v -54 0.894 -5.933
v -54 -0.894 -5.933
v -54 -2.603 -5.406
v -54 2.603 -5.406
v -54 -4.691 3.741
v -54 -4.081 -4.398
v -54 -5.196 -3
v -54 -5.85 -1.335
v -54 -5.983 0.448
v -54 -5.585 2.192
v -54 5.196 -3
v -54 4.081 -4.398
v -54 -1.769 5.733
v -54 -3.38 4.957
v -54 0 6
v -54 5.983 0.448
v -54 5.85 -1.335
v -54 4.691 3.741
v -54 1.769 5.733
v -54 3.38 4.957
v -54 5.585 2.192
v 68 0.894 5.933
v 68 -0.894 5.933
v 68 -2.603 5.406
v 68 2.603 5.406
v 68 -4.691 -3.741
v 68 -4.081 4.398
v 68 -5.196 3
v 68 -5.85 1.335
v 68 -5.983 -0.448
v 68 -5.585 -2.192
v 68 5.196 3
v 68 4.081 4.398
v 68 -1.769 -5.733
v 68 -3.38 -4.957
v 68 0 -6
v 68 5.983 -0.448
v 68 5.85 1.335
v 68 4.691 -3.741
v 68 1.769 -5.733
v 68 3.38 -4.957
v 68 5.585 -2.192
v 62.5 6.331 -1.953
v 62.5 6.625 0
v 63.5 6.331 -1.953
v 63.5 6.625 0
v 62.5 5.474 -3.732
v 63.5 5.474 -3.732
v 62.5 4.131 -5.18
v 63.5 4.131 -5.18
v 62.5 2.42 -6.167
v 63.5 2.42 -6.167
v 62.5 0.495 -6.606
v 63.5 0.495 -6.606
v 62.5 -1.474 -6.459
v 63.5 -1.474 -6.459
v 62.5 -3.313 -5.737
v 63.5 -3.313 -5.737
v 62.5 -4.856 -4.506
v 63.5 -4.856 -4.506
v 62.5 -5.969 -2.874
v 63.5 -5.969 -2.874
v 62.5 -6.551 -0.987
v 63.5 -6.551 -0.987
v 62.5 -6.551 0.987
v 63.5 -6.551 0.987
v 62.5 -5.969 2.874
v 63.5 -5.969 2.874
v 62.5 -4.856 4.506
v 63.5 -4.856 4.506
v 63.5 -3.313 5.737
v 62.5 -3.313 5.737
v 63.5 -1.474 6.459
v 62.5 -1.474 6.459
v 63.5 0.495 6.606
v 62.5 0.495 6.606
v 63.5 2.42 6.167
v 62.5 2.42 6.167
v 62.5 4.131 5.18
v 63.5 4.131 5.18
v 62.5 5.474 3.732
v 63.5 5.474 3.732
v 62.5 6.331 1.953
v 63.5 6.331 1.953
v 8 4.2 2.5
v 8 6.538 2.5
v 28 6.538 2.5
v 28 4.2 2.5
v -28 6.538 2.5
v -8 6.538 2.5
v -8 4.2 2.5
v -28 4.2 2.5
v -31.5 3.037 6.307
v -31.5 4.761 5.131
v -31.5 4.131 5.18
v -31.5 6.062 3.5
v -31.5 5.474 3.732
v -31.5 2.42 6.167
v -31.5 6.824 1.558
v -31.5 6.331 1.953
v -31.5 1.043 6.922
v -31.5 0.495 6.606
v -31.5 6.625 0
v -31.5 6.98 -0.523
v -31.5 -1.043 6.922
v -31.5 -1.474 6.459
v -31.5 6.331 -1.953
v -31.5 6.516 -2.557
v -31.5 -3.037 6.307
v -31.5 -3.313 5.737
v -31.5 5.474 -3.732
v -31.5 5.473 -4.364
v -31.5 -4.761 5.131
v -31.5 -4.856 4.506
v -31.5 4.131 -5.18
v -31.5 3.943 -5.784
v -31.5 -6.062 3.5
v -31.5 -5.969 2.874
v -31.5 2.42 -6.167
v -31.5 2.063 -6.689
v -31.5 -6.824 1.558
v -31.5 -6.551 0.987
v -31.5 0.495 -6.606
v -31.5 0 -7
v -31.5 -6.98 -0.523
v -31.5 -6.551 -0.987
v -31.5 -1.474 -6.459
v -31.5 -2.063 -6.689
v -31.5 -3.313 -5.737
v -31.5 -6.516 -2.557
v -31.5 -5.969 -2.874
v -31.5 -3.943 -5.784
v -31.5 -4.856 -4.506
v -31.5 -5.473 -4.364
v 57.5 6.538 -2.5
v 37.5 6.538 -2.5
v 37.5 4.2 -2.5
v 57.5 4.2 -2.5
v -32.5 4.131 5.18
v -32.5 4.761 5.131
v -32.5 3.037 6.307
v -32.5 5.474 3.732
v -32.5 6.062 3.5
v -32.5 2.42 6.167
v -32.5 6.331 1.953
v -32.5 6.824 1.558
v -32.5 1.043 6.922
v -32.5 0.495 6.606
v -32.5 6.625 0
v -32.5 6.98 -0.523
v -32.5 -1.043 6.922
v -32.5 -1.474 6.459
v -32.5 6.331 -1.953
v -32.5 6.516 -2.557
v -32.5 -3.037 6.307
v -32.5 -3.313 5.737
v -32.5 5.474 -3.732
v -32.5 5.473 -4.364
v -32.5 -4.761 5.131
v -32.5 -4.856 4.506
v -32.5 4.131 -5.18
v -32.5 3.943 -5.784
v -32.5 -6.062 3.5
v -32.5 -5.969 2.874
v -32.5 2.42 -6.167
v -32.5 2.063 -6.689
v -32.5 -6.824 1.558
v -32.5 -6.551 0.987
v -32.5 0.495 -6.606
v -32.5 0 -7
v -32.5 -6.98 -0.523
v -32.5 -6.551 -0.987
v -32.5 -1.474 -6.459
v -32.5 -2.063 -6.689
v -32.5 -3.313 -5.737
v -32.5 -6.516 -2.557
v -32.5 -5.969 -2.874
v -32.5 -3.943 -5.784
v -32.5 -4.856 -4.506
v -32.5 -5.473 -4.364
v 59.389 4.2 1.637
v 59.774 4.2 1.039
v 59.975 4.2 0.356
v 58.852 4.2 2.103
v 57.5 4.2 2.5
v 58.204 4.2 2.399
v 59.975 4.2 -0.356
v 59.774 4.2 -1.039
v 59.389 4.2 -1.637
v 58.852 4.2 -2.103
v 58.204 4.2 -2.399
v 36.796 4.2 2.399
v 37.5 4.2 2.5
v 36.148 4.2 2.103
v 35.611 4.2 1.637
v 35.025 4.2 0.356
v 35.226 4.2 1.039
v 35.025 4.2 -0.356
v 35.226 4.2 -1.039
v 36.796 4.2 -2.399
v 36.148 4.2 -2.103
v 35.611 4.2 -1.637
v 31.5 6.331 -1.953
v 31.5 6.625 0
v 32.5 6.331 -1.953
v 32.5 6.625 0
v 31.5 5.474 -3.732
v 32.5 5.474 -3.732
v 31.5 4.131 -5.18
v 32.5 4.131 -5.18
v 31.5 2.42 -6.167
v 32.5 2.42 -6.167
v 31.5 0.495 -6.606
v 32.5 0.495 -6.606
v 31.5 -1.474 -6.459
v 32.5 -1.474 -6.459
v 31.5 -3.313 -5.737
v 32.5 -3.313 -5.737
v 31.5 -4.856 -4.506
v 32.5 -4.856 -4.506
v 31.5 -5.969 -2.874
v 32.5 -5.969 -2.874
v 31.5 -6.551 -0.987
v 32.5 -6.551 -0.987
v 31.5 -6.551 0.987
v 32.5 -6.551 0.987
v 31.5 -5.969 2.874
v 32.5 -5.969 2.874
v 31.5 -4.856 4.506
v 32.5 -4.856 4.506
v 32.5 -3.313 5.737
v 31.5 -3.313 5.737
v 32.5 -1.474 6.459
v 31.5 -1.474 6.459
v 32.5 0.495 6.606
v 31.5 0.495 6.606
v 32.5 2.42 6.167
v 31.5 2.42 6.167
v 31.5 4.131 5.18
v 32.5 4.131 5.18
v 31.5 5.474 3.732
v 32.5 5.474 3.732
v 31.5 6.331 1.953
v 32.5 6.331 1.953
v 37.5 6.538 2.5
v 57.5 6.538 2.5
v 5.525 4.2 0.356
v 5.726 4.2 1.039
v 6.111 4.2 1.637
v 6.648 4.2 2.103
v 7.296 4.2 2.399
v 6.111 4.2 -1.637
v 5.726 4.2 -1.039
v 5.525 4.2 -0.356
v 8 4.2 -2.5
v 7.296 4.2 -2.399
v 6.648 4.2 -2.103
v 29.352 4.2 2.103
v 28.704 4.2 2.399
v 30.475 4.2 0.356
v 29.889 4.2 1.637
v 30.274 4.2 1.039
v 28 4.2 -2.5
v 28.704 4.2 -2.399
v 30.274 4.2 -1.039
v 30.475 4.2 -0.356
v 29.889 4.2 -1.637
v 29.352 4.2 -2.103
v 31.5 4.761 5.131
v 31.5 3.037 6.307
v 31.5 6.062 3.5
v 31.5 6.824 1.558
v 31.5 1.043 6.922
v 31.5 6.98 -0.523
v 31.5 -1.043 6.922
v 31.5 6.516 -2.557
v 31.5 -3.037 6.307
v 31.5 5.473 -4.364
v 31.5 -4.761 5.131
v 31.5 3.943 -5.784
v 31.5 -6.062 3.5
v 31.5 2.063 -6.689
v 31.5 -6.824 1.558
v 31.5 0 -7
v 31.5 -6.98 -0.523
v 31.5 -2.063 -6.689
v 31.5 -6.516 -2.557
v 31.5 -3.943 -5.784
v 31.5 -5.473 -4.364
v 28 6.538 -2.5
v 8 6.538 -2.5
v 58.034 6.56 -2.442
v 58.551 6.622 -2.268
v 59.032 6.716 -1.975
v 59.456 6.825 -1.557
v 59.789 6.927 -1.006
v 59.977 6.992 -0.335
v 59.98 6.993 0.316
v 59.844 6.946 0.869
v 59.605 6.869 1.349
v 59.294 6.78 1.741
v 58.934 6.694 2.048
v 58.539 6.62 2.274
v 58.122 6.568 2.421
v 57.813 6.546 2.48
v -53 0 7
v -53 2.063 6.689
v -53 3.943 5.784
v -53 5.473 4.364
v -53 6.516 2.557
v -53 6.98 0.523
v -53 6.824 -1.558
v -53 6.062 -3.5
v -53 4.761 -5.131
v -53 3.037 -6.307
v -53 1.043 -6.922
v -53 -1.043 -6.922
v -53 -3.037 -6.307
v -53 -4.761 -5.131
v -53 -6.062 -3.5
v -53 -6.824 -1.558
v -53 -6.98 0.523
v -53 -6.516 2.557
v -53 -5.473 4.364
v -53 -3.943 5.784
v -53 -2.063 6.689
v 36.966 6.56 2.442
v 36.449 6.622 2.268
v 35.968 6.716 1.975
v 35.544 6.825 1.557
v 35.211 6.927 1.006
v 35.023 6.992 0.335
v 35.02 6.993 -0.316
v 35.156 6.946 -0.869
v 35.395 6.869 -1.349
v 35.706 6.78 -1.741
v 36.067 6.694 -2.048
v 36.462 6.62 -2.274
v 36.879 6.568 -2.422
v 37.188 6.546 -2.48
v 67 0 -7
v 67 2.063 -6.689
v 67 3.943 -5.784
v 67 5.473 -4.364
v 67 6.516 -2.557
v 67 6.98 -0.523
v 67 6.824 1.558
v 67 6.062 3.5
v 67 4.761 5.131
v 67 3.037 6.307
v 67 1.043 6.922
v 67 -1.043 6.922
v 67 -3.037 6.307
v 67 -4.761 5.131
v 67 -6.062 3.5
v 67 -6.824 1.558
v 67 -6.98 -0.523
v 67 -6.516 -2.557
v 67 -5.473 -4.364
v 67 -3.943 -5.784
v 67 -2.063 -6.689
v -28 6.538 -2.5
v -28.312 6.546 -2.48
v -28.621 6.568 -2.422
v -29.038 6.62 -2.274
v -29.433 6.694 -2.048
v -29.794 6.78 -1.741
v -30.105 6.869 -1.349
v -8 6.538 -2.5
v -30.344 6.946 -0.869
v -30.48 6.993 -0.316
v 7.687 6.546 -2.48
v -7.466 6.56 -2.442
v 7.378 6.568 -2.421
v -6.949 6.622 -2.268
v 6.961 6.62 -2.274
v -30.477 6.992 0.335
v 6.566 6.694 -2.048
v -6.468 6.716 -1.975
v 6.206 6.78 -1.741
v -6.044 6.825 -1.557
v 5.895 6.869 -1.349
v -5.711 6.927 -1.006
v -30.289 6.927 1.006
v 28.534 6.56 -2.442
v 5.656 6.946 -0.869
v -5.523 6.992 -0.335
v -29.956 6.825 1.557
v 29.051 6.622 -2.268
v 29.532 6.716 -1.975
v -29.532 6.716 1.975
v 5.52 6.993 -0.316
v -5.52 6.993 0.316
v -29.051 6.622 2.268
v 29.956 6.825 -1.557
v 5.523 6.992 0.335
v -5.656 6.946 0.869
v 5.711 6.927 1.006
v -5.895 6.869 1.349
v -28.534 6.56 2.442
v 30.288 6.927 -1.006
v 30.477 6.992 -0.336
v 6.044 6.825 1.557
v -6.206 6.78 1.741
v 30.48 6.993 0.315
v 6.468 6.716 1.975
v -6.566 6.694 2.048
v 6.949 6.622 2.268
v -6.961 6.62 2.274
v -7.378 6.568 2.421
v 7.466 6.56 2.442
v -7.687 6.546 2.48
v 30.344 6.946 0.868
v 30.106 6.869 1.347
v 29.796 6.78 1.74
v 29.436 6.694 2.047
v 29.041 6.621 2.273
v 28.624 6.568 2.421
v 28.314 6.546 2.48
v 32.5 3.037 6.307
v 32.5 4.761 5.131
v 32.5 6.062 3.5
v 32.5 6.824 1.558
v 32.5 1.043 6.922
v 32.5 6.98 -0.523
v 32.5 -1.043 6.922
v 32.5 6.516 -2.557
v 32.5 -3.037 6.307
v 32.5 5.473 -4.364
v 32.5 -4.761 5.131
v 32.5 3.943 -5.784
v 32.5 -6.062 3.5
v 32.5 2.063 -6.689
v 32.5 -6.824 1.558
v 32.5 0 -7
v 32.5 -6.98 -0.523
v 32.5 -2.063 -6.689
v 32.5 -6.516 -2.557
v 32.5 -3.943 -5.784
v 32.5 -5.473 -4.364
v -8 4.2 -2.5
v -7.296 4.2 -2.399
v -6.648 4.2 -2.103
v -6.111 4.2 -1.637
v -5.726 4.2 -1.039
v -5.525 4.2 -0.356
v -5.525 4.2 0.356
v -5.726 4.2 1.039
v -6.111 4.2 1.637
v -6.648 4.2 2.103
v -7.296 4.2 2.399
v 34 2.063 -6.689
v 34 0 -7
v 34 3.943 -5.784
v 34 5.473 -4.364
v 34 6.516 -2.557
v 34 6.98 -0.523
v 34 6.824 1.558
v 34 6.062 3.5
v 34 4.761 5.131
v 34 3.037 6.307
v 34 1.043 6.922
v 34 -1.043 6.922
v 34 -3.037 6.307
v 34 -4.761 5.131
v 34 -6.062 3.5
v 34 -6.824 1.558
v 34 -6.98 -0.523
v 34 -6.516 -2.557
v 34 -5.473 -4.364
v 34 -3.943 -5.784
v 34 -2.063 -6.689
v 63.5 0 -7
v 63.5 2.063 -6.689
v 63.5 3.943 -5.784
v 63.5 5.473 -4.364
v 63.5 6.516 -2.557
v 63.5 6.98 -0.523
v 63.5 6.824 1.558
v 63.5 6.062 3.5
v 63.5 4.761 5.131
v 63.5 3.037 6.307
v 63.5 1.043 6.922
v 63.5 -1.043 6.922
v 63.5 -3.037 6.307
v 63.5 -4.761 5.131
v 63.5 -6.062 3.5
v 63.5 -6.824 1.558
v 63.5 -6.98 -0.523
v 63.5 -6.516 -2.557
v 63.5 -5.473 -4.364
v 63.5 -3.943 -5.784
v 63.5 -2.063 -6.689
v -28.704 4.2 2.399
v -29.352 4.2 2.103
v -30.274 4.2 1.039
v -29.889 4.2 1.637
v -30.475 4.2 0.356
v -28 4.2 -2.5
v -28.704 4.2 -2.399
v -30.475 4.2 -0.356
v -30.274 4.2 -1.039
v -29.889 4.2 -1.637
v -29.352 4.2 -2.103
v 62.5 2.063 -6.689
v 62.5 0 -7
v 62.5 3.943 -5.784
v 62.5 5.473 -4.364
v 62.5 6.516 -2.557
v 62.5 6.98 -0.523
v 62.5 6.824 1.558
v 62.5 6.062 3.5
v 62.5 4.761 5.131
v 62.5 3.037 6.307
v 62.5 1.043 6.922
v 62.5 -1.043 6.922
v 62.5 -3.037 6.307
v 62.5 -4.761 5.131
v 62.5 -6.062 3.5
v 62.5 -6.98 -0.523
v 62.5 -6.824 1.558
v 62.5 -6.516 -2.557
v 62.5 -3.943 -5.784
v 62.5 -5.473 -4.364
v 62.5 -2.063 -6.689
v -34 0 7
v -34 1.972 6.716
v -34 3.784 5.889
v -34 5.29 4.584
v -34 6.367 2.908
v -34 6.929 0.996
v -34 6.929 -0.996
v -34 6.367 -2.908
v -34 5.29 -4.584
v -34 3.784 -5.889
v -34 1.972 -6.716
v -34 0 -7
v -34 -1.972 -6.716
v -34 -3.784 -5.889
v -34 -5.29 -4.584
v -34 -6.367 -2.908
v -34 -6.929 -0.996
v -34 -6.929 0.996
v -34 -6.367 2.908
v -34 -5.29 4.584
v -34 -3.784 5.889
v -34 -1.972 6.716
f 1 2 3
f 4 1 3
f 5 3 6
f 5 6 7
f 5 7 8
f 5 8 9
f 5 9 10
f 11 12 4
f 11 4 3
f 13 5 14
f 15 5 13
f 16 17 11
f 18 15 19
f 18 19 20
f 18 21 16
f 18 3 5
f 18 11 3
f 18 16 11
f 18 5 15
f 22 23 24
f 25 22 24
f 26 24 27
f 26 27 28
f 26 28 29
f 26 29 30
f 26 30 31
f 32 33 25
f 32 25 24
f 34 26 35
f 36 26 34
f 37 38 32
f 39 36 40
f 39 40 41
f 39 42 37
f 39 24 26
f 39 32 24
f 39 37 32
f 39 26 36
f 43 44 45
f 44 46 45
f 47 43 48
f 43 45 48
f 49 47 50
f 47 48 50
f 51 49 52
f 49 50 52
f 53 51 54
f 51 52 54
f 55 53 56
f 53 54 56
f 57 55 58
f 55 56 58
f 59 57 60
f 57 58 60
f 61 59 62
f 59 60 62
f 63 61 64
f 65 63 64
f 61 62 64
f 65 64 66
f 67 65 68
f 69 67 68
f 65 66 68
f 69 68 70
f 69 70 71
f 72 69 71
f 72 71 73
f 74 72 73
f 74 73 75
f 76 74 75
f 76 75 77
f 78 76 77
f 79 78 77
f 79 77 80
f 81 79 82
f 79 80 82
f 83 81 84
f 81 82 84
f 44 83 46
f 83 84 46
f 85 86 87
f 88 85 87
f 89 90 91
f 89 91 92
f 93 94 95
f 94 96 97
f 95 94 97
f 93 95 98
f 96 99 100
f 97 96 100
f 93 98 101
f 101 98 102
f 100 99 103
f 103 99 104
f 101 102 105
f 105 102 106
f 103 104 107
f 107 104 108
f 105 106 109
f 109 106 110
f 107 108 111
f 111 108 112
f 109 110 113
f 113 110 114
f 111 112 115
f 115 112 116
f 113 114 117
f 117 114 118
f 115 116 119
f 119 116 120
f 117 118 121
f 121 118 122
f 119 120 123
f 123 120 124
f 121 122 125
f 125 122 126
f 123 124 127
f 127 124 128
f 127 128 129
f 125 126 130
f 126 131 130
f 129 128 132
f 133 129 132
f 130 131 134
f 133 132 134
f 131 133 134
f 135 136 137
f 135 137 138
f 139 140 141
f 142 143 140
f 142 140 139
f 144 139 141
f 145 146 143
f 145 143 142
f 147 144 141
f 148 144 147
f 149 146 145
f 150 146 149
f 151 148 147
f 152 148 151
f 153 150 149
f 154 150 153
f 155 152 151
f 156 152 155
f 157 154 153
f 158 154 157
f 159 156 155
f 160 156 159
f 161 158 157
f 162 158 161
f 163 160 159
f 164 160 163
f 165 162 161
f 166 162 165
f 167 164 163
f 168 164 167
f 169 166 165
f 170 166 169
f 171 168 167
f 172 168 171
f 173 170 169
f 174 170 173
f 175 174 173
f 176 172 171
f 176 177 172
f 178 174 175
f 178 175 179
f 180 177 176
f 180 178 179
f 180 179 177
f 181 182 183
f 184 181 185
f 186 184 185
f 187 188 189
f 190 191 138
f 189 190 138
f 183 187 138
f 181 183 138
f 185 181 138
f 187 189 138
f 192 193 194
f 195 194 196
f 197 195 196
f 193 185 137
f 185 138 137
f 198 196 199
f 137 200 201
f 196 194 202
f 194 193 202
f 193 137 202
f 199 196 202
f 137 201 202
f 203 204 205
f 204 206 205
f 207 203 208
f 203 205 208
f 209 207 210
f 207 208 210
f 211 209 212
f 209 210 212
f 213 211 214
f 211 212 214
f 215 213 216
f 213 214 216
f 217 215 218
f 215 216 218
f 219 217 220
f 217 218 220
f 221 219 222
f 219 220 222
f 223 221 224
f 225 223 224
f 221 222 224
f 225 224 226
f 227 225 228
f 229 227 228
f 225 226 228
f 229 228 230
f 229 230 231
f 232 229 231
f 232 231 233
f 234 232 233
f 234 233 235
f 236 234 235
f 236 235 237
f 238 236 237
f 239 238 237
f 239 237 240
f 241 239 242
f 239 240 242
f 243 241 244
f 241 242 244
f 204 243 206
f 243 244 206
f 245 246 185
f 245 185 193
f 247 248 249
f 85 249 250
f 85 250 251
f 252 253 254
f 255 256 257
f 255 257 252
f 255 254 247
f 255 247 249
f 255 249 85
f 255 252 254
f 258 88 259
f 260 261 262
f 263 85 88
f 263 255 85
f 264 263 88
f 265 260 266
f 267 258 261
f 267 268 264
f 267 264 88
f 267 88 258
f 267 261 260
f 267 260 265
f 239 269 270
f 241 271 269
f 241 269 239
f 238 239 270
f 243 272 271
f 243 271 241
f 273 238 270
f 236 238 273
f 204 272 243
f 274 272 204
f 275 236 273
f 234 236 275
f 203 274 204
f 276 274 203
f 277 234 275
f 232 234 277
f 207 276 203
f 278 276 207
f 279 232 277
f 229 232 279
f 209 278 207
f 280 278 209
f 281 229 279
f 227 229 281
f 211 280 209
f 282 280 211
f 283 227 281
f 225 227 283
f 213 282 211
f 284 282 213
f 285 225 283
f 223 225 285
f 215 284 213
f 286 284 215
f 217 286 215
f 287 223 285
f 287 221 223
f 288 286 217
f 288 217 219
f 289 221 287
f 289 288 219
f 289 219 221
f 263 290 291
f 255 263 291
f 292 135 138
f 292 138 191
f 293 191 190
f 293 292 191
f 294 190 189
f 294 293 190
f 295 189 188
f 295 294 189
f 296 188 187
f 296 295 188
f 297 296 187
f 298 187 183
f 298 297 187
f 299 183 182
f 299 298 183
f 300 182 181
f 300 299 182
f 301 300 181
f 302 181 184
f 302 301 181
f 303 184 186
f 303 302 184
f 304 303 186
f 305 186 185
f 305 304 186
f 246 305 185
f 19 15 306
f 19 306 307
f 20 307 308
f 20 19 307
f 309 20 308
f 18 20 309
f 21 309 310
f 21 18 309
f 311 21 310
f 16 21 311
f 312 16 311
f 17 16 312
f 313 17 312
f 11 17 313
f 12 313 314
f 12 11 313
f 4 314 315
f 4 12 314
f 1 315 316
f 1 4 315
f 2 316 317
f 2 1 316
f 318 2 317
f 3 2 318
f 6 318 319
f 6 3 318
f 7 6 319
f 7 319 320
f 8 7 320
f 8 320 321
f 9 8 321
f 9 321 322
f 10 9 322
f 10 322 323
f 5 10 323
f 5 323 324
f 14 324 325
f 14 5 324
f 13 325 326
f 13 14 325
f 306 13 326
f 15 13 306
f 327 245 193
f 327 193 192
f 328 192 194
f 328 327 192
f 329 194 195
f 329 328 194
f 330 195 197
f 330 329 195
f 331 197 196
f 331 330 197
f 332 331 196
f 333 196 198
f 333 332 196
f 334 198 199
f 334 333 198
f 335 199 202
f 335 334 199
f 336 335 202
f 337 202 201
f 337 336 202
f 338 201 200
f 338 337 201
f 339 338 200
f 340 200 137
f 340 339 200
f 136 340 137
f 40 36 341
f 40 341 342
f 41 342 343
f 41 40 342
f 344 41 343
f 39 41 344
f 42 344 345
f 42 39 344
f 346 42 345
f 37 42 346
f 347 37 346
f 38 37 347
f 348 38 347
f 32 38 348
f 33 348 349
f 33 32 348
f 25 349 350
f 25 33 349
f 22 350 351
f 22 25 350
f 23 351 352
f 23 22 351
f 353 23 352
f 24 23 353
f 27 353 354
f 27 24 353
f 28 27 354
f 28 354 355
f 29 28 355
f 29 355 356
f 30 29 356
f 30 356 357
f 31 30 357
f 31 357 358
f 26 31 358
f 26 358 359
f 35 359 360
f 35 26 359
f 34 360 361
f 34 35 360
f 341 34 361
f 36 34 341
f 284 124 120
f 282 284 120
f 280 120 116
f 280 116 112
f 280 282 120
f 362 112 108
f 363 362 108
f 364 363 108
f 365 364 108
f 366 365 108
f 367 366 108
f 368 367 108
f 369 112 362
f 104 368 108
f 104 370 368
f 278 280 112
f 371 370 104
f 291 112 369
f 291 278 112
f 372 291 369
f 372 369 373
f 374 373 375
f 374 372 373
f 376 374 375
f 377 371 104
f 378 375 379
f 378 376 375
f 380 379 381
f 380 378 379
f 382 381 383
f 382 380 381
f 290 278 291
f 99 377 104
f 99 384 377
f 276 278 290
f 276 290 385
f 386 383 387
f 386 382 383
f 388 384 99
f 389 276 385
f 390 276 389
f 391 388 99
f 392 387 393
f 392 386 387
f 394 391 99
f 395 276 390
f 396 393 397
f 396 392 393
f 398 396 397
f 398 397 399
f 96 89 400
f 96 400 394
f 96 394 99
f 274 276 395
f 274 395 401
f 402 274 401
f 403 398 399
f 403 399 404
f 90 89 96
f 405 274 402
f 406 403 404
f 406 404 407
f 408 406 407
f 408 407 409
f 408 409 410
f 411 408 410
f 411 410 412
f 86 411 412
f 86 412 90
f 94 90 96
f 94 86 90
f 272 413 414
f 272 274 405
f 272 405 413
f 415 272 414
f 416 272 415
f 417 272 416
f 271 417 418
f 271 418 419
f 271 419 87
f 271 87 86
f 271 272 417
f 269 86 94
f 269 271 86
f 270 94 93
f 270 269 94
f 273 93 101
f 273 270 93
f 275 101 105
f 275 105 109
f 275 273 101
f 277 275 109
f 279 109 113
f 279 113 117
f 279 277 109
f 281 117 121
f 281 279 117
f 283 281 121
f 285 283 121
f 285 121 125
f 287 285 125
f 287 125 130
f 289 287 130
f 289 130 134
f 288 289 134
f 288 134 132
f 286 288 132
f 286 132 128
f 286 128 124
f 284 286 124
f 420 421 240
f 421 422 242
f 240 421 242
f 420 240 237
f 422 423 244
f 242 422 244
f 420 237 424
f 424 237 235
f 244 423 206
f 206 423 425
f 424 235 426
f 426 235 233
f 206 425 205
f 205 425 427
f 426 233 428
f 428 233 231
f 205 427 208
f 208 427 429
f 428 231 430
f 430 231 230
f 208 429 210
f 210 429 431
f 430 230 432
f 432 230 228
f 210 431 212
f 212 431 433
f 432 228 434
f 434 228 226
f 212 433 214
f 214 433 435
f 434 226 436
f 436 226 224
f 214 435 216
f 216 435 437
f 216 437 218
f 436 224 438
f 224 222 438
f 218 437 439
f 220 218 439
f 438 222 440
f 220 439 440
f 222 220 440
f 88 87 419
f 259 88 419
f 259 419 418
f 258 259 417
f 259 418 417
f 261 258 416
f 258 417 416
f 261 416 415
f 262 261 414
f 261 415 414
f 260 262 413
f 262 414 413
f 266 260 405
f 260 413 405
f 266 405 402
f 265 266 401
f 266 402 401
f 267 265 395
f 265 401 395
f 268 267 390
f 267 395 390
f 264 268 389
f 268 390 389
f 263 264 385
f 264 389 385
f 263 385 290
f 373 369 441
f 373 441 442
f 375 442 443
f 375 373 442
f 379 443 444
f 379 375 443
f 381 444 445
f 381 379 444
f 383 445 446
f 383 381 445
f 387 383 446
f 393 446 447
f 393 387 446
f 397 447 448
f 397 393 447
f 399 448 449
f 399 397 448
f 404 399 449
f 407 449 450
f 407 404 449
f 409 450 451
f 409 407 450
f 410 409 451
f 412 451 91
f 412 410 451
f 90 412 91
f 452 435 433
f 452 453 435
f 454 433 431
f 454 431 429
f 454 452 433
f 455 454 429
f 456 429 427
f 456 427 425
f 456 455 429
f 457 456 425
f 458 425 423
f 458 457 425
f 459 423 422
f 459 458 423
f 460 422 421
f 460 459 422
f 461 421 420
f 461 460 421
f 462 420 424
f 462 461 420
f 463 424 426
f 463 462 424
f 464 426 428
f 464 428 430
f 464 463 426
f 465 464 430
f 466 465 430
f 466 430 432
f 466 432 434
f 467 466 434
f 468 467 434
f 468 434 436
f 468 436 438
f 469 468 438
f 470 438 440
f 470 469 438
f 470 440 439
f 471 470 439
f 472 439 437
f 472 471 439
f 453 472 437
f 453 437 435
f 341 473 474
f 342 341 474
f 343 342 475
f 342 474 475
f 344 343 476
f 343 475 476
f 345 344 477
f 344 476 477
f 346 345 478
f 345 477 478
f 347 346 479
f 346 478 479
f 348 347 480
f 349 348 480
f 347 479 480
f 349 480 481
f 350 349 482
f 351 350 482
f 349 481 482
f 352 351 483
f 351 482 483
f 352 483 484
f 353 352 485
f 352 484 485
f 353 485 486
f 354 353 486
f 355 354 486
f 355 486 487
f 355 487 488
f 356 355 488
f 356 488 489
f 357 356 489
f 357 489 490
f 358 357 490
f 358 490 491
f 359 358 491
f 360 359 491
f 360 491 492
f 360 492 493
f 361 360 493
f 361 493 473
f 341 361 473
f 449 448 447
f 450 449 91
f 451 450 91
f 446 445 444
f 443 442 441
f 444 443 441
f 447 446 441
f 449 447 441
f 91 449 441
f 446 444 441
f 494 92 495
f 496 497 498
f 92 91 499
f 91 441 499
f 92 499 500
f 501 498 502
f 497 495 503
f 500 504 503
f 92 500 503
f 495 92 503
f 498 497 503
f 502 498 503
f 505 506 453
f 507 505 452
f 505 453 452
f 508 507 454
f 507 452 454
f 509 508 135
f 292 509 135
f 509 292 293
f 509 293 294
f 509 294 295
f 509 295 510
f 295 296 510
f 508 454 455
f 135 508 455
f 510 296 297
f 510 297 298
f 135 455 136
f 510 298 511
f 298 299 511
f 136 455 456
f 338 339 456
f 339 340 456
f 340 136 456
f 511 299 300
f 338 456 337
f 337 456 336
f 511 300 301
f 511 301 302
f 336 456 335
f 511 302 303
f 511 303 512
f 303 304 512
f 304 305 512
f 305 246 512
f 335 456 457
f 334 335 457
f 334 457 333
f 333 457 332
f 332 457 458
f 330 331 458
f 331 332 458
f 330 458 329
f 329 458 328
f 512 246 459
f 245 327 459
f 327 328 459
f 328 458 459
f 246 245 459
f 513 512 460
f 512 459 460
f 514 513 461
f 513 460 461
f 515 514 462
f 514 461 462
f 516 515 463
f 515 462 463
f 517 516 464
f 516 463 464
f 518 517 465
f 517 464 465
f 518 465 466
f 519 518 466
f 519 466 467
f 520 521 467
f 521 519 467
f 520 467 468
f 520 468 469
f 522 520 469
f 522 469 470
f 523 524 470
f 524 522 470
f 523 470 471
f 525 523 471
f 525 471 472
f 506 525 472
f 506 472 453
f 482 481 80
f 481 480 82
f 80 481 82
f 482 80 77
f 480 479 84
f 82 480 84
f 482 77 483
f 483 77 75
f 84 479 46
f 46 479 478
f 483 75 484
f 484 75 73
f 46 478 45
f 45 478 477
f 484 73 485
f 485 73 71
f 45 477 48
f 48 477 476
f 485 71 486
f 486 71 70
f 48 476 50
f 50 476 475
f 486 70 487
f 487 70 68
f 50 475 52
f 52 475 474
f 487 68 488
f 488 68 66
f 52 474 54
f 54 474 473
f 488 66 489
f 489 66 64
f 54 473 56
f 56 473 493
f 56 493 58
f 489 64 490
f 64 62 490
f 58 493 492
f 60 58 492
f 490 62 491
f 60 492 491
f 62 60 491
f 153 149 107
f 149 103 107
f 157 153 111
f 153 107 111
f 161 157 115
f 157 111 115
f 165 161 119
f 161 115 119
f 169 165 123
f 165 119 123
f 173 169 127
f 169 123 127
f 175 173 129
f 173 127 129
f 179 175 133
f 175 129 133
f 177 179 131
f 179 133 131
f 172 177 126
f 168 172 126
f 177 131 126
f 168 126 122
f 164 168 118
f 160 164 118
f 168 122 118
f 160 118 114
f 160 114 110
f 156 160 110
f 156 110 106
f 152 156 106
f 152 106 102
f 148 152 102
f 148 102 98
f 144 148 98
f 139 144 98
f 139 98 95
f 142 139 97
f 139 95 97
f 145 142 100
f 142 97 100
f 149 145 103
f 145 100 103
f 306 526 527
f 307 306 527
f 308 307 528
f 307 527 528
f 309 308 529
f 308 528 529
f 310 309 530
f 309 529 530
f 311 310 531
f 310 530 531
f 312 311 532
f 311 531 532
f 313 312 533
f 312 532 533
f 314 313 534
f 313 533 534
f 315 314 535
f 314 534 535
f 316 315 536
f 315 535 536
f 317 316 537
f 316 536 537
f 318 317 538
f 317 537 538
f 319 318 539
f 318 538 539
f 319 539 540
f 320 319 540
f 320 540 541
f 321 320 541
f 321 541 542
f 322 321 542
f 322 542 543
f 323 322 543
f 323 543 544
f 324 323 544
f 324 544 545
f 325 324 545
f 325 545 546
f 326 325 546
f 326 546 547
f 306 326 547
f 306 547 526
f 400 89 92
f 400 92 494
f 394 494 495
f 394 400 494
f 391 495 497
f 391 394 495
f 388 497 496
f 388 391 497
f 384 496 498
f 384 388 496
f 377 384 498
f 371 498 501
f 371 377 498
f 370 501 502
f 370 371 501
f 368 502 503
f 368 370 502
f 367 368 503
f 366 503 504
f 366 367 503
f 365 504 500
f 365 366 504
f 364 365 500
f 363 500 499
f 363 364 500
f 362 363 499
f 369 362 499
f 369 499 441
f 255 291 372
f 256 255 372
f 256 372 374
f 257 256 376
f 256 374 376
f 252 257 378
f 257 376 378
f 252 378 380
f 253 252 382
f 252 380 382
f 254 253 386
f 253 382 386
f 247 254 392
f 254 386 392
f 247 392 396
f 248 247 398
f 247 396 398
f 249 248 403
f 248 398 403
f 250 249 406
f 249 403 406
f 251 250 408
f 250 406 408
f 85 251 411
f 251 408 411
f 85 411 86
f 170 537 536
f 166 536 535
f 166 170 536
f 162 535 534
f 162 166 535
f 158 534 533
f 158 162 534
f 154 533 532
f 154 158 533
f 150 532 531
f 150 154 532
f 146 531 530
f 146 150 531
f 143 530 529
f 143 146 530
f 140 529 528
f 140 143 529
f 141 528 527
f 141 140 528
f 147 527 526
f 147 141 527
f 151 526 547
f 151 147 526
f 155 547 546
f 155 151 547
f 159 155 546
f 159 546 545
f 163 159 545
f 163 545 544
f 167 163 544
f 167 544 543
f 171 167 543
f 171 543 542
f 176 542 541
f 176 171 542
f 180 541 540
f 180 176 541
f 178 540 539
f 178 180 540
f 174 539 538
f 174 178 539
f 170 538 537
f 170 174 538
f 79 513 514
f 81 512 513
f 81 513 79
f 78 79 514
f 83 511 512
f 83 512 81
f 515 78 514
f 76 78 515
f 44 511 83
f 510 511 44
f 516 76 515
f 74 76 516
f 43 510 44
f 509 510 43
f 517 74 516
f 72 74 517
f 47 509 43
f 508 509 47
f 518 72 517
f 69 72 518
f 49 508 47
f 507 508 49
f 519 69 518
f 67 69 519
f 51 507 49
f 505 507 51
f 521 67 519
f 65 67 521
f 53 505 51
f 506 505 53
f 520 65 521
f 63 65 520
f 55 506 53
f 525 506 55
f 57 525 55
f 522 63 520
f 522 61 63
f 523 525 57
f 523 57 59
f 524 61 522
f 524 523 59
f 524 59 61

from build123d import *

# Parameters (mm, degrees)
SKETCH1_R           = 7
BOSS_EXTRUDE1_DEPTH = 34
CUT_EXTRUDE1_DEPTH  = 2.8
SKETCH5_R           = 7
BOSS_EXTRUDE3_DEPTH = 20
SKETCH7_R           = 7
BOSS_EXTRUDE4_DEPTH = 34
SKETCH11_W          = 1
SKETCH11_H          = 0.75
CHAMFER1_SIZE       = 1
CUT_EXTRUDE3_DEPTH  = 2.8


with BuildPart() as part:
    # Sketch1 → Boss-Extrude1 (new body, symmetric)
    with BuildSketch(Plane(origin=(0, 0, 0), x_dir=(0, 0, -1), z_dir=(1, 0, 0))):
        Circle(SKETCH1_R)
    extrude(amount=BOSS_EXTRUDE1_DEPTH, both=True)

    # Sketch4 → Cut-Extrude1 (cut)
    with BuildSketch(Plane(origin=(0, 7, 0), x_dir=(1, 0, 0), z_dir=(0, 1, 0))):
        with BuildLine():
            Line((-28, 2.5), (-8, 2.5))
            ThreePointArc((-8, 2.5), (-5.5, 0), (-8, -2.5))
            Line((-8, -2.5), (-28, -2.5))
            ThreePointArc((-28, -2.5), (-30.5, 0), (-28, 2.5))
        make_face()
    cut_extrude1 = extrude(amount=-CUT_EXTRUDE1_DEPTH, mode=Mode.SUBTRACT)

    # Mirror1: Cut-Extrude1 across plane
    add(cut_extrude1.mirror(Plane(origin=(0, 0, 0), x_dir=(0, 0, 1), z_dir=(1, 0, 0))), mode=Mode.SUBTRACT)

    # Sketch5 → Boss-Extrude3 (add)
    with BuildSketch(Plane.ZY.offset(34)):
        Circle(SKETCH5_R)
    extrude(amount=BOSS_EXTRUDE3_DEPTH)

    # Sketch7 → Boss-Extrude4 (add)
    with BuildSketch(Plane(origin=(34, 0, 0), x_dir=(0, 0, -1), z_dir=(1, 0, 0))):
        Circle(SKETCH7_R)
    extrude(amount=BOSS_EXTRUDE4_DEPTH)

    # Sketch11 → Cut-Revolve1 (revolve, cut)
    with BuildSketch(Plane.XY):
        with Locations((63, 7)):
            Rectangle(SKETCH11_W, SKETCH11_H)
        with Locations((32, 7)):
            Rectangle(SKETCH11_W, SKETCH11_H)
        with Locations((-32, 7)):
            Rectangle(SKETCH11_W, SKETCH11_H)
    revolve(axis=Axis((71.5, 0, 0), (-1, 0, 0)), mode=Mode.SUBTRACT)

    # Chamfer1
    chamfer1_edges = [part.edges().sort_by_distance(p)[0] for p in [
        (-54, 0, -7),
        (68, 0, 7),
    ]]
    chamfer(chamfer1_edges, length=CHAMFER1_SIZE)

    # Sketch9 → Cut-Extrude3 (cut)
    with BuildSketch(Plane(origin=(0, 7, 0), x_dir=(1, 0, 0), z_dir=(0, 1, 0))):
        with BuildLine():
            Line((37.5, 2.5), (57.5, 2.5))
            ThreePointArc((57.5, 2.5), (60, 0), (57.5, -2.5))
            Line((57.5, -2.5), (37.5, -2.5))
            ThreePointArc((37.5, -2.5), (35, 0), (37.5, 2.5))
        make_face()
    extrude(amount=-CUT_EXTRUDE3_DEPTH, mode=Mode.SUBTRACT)


solid = part.part
